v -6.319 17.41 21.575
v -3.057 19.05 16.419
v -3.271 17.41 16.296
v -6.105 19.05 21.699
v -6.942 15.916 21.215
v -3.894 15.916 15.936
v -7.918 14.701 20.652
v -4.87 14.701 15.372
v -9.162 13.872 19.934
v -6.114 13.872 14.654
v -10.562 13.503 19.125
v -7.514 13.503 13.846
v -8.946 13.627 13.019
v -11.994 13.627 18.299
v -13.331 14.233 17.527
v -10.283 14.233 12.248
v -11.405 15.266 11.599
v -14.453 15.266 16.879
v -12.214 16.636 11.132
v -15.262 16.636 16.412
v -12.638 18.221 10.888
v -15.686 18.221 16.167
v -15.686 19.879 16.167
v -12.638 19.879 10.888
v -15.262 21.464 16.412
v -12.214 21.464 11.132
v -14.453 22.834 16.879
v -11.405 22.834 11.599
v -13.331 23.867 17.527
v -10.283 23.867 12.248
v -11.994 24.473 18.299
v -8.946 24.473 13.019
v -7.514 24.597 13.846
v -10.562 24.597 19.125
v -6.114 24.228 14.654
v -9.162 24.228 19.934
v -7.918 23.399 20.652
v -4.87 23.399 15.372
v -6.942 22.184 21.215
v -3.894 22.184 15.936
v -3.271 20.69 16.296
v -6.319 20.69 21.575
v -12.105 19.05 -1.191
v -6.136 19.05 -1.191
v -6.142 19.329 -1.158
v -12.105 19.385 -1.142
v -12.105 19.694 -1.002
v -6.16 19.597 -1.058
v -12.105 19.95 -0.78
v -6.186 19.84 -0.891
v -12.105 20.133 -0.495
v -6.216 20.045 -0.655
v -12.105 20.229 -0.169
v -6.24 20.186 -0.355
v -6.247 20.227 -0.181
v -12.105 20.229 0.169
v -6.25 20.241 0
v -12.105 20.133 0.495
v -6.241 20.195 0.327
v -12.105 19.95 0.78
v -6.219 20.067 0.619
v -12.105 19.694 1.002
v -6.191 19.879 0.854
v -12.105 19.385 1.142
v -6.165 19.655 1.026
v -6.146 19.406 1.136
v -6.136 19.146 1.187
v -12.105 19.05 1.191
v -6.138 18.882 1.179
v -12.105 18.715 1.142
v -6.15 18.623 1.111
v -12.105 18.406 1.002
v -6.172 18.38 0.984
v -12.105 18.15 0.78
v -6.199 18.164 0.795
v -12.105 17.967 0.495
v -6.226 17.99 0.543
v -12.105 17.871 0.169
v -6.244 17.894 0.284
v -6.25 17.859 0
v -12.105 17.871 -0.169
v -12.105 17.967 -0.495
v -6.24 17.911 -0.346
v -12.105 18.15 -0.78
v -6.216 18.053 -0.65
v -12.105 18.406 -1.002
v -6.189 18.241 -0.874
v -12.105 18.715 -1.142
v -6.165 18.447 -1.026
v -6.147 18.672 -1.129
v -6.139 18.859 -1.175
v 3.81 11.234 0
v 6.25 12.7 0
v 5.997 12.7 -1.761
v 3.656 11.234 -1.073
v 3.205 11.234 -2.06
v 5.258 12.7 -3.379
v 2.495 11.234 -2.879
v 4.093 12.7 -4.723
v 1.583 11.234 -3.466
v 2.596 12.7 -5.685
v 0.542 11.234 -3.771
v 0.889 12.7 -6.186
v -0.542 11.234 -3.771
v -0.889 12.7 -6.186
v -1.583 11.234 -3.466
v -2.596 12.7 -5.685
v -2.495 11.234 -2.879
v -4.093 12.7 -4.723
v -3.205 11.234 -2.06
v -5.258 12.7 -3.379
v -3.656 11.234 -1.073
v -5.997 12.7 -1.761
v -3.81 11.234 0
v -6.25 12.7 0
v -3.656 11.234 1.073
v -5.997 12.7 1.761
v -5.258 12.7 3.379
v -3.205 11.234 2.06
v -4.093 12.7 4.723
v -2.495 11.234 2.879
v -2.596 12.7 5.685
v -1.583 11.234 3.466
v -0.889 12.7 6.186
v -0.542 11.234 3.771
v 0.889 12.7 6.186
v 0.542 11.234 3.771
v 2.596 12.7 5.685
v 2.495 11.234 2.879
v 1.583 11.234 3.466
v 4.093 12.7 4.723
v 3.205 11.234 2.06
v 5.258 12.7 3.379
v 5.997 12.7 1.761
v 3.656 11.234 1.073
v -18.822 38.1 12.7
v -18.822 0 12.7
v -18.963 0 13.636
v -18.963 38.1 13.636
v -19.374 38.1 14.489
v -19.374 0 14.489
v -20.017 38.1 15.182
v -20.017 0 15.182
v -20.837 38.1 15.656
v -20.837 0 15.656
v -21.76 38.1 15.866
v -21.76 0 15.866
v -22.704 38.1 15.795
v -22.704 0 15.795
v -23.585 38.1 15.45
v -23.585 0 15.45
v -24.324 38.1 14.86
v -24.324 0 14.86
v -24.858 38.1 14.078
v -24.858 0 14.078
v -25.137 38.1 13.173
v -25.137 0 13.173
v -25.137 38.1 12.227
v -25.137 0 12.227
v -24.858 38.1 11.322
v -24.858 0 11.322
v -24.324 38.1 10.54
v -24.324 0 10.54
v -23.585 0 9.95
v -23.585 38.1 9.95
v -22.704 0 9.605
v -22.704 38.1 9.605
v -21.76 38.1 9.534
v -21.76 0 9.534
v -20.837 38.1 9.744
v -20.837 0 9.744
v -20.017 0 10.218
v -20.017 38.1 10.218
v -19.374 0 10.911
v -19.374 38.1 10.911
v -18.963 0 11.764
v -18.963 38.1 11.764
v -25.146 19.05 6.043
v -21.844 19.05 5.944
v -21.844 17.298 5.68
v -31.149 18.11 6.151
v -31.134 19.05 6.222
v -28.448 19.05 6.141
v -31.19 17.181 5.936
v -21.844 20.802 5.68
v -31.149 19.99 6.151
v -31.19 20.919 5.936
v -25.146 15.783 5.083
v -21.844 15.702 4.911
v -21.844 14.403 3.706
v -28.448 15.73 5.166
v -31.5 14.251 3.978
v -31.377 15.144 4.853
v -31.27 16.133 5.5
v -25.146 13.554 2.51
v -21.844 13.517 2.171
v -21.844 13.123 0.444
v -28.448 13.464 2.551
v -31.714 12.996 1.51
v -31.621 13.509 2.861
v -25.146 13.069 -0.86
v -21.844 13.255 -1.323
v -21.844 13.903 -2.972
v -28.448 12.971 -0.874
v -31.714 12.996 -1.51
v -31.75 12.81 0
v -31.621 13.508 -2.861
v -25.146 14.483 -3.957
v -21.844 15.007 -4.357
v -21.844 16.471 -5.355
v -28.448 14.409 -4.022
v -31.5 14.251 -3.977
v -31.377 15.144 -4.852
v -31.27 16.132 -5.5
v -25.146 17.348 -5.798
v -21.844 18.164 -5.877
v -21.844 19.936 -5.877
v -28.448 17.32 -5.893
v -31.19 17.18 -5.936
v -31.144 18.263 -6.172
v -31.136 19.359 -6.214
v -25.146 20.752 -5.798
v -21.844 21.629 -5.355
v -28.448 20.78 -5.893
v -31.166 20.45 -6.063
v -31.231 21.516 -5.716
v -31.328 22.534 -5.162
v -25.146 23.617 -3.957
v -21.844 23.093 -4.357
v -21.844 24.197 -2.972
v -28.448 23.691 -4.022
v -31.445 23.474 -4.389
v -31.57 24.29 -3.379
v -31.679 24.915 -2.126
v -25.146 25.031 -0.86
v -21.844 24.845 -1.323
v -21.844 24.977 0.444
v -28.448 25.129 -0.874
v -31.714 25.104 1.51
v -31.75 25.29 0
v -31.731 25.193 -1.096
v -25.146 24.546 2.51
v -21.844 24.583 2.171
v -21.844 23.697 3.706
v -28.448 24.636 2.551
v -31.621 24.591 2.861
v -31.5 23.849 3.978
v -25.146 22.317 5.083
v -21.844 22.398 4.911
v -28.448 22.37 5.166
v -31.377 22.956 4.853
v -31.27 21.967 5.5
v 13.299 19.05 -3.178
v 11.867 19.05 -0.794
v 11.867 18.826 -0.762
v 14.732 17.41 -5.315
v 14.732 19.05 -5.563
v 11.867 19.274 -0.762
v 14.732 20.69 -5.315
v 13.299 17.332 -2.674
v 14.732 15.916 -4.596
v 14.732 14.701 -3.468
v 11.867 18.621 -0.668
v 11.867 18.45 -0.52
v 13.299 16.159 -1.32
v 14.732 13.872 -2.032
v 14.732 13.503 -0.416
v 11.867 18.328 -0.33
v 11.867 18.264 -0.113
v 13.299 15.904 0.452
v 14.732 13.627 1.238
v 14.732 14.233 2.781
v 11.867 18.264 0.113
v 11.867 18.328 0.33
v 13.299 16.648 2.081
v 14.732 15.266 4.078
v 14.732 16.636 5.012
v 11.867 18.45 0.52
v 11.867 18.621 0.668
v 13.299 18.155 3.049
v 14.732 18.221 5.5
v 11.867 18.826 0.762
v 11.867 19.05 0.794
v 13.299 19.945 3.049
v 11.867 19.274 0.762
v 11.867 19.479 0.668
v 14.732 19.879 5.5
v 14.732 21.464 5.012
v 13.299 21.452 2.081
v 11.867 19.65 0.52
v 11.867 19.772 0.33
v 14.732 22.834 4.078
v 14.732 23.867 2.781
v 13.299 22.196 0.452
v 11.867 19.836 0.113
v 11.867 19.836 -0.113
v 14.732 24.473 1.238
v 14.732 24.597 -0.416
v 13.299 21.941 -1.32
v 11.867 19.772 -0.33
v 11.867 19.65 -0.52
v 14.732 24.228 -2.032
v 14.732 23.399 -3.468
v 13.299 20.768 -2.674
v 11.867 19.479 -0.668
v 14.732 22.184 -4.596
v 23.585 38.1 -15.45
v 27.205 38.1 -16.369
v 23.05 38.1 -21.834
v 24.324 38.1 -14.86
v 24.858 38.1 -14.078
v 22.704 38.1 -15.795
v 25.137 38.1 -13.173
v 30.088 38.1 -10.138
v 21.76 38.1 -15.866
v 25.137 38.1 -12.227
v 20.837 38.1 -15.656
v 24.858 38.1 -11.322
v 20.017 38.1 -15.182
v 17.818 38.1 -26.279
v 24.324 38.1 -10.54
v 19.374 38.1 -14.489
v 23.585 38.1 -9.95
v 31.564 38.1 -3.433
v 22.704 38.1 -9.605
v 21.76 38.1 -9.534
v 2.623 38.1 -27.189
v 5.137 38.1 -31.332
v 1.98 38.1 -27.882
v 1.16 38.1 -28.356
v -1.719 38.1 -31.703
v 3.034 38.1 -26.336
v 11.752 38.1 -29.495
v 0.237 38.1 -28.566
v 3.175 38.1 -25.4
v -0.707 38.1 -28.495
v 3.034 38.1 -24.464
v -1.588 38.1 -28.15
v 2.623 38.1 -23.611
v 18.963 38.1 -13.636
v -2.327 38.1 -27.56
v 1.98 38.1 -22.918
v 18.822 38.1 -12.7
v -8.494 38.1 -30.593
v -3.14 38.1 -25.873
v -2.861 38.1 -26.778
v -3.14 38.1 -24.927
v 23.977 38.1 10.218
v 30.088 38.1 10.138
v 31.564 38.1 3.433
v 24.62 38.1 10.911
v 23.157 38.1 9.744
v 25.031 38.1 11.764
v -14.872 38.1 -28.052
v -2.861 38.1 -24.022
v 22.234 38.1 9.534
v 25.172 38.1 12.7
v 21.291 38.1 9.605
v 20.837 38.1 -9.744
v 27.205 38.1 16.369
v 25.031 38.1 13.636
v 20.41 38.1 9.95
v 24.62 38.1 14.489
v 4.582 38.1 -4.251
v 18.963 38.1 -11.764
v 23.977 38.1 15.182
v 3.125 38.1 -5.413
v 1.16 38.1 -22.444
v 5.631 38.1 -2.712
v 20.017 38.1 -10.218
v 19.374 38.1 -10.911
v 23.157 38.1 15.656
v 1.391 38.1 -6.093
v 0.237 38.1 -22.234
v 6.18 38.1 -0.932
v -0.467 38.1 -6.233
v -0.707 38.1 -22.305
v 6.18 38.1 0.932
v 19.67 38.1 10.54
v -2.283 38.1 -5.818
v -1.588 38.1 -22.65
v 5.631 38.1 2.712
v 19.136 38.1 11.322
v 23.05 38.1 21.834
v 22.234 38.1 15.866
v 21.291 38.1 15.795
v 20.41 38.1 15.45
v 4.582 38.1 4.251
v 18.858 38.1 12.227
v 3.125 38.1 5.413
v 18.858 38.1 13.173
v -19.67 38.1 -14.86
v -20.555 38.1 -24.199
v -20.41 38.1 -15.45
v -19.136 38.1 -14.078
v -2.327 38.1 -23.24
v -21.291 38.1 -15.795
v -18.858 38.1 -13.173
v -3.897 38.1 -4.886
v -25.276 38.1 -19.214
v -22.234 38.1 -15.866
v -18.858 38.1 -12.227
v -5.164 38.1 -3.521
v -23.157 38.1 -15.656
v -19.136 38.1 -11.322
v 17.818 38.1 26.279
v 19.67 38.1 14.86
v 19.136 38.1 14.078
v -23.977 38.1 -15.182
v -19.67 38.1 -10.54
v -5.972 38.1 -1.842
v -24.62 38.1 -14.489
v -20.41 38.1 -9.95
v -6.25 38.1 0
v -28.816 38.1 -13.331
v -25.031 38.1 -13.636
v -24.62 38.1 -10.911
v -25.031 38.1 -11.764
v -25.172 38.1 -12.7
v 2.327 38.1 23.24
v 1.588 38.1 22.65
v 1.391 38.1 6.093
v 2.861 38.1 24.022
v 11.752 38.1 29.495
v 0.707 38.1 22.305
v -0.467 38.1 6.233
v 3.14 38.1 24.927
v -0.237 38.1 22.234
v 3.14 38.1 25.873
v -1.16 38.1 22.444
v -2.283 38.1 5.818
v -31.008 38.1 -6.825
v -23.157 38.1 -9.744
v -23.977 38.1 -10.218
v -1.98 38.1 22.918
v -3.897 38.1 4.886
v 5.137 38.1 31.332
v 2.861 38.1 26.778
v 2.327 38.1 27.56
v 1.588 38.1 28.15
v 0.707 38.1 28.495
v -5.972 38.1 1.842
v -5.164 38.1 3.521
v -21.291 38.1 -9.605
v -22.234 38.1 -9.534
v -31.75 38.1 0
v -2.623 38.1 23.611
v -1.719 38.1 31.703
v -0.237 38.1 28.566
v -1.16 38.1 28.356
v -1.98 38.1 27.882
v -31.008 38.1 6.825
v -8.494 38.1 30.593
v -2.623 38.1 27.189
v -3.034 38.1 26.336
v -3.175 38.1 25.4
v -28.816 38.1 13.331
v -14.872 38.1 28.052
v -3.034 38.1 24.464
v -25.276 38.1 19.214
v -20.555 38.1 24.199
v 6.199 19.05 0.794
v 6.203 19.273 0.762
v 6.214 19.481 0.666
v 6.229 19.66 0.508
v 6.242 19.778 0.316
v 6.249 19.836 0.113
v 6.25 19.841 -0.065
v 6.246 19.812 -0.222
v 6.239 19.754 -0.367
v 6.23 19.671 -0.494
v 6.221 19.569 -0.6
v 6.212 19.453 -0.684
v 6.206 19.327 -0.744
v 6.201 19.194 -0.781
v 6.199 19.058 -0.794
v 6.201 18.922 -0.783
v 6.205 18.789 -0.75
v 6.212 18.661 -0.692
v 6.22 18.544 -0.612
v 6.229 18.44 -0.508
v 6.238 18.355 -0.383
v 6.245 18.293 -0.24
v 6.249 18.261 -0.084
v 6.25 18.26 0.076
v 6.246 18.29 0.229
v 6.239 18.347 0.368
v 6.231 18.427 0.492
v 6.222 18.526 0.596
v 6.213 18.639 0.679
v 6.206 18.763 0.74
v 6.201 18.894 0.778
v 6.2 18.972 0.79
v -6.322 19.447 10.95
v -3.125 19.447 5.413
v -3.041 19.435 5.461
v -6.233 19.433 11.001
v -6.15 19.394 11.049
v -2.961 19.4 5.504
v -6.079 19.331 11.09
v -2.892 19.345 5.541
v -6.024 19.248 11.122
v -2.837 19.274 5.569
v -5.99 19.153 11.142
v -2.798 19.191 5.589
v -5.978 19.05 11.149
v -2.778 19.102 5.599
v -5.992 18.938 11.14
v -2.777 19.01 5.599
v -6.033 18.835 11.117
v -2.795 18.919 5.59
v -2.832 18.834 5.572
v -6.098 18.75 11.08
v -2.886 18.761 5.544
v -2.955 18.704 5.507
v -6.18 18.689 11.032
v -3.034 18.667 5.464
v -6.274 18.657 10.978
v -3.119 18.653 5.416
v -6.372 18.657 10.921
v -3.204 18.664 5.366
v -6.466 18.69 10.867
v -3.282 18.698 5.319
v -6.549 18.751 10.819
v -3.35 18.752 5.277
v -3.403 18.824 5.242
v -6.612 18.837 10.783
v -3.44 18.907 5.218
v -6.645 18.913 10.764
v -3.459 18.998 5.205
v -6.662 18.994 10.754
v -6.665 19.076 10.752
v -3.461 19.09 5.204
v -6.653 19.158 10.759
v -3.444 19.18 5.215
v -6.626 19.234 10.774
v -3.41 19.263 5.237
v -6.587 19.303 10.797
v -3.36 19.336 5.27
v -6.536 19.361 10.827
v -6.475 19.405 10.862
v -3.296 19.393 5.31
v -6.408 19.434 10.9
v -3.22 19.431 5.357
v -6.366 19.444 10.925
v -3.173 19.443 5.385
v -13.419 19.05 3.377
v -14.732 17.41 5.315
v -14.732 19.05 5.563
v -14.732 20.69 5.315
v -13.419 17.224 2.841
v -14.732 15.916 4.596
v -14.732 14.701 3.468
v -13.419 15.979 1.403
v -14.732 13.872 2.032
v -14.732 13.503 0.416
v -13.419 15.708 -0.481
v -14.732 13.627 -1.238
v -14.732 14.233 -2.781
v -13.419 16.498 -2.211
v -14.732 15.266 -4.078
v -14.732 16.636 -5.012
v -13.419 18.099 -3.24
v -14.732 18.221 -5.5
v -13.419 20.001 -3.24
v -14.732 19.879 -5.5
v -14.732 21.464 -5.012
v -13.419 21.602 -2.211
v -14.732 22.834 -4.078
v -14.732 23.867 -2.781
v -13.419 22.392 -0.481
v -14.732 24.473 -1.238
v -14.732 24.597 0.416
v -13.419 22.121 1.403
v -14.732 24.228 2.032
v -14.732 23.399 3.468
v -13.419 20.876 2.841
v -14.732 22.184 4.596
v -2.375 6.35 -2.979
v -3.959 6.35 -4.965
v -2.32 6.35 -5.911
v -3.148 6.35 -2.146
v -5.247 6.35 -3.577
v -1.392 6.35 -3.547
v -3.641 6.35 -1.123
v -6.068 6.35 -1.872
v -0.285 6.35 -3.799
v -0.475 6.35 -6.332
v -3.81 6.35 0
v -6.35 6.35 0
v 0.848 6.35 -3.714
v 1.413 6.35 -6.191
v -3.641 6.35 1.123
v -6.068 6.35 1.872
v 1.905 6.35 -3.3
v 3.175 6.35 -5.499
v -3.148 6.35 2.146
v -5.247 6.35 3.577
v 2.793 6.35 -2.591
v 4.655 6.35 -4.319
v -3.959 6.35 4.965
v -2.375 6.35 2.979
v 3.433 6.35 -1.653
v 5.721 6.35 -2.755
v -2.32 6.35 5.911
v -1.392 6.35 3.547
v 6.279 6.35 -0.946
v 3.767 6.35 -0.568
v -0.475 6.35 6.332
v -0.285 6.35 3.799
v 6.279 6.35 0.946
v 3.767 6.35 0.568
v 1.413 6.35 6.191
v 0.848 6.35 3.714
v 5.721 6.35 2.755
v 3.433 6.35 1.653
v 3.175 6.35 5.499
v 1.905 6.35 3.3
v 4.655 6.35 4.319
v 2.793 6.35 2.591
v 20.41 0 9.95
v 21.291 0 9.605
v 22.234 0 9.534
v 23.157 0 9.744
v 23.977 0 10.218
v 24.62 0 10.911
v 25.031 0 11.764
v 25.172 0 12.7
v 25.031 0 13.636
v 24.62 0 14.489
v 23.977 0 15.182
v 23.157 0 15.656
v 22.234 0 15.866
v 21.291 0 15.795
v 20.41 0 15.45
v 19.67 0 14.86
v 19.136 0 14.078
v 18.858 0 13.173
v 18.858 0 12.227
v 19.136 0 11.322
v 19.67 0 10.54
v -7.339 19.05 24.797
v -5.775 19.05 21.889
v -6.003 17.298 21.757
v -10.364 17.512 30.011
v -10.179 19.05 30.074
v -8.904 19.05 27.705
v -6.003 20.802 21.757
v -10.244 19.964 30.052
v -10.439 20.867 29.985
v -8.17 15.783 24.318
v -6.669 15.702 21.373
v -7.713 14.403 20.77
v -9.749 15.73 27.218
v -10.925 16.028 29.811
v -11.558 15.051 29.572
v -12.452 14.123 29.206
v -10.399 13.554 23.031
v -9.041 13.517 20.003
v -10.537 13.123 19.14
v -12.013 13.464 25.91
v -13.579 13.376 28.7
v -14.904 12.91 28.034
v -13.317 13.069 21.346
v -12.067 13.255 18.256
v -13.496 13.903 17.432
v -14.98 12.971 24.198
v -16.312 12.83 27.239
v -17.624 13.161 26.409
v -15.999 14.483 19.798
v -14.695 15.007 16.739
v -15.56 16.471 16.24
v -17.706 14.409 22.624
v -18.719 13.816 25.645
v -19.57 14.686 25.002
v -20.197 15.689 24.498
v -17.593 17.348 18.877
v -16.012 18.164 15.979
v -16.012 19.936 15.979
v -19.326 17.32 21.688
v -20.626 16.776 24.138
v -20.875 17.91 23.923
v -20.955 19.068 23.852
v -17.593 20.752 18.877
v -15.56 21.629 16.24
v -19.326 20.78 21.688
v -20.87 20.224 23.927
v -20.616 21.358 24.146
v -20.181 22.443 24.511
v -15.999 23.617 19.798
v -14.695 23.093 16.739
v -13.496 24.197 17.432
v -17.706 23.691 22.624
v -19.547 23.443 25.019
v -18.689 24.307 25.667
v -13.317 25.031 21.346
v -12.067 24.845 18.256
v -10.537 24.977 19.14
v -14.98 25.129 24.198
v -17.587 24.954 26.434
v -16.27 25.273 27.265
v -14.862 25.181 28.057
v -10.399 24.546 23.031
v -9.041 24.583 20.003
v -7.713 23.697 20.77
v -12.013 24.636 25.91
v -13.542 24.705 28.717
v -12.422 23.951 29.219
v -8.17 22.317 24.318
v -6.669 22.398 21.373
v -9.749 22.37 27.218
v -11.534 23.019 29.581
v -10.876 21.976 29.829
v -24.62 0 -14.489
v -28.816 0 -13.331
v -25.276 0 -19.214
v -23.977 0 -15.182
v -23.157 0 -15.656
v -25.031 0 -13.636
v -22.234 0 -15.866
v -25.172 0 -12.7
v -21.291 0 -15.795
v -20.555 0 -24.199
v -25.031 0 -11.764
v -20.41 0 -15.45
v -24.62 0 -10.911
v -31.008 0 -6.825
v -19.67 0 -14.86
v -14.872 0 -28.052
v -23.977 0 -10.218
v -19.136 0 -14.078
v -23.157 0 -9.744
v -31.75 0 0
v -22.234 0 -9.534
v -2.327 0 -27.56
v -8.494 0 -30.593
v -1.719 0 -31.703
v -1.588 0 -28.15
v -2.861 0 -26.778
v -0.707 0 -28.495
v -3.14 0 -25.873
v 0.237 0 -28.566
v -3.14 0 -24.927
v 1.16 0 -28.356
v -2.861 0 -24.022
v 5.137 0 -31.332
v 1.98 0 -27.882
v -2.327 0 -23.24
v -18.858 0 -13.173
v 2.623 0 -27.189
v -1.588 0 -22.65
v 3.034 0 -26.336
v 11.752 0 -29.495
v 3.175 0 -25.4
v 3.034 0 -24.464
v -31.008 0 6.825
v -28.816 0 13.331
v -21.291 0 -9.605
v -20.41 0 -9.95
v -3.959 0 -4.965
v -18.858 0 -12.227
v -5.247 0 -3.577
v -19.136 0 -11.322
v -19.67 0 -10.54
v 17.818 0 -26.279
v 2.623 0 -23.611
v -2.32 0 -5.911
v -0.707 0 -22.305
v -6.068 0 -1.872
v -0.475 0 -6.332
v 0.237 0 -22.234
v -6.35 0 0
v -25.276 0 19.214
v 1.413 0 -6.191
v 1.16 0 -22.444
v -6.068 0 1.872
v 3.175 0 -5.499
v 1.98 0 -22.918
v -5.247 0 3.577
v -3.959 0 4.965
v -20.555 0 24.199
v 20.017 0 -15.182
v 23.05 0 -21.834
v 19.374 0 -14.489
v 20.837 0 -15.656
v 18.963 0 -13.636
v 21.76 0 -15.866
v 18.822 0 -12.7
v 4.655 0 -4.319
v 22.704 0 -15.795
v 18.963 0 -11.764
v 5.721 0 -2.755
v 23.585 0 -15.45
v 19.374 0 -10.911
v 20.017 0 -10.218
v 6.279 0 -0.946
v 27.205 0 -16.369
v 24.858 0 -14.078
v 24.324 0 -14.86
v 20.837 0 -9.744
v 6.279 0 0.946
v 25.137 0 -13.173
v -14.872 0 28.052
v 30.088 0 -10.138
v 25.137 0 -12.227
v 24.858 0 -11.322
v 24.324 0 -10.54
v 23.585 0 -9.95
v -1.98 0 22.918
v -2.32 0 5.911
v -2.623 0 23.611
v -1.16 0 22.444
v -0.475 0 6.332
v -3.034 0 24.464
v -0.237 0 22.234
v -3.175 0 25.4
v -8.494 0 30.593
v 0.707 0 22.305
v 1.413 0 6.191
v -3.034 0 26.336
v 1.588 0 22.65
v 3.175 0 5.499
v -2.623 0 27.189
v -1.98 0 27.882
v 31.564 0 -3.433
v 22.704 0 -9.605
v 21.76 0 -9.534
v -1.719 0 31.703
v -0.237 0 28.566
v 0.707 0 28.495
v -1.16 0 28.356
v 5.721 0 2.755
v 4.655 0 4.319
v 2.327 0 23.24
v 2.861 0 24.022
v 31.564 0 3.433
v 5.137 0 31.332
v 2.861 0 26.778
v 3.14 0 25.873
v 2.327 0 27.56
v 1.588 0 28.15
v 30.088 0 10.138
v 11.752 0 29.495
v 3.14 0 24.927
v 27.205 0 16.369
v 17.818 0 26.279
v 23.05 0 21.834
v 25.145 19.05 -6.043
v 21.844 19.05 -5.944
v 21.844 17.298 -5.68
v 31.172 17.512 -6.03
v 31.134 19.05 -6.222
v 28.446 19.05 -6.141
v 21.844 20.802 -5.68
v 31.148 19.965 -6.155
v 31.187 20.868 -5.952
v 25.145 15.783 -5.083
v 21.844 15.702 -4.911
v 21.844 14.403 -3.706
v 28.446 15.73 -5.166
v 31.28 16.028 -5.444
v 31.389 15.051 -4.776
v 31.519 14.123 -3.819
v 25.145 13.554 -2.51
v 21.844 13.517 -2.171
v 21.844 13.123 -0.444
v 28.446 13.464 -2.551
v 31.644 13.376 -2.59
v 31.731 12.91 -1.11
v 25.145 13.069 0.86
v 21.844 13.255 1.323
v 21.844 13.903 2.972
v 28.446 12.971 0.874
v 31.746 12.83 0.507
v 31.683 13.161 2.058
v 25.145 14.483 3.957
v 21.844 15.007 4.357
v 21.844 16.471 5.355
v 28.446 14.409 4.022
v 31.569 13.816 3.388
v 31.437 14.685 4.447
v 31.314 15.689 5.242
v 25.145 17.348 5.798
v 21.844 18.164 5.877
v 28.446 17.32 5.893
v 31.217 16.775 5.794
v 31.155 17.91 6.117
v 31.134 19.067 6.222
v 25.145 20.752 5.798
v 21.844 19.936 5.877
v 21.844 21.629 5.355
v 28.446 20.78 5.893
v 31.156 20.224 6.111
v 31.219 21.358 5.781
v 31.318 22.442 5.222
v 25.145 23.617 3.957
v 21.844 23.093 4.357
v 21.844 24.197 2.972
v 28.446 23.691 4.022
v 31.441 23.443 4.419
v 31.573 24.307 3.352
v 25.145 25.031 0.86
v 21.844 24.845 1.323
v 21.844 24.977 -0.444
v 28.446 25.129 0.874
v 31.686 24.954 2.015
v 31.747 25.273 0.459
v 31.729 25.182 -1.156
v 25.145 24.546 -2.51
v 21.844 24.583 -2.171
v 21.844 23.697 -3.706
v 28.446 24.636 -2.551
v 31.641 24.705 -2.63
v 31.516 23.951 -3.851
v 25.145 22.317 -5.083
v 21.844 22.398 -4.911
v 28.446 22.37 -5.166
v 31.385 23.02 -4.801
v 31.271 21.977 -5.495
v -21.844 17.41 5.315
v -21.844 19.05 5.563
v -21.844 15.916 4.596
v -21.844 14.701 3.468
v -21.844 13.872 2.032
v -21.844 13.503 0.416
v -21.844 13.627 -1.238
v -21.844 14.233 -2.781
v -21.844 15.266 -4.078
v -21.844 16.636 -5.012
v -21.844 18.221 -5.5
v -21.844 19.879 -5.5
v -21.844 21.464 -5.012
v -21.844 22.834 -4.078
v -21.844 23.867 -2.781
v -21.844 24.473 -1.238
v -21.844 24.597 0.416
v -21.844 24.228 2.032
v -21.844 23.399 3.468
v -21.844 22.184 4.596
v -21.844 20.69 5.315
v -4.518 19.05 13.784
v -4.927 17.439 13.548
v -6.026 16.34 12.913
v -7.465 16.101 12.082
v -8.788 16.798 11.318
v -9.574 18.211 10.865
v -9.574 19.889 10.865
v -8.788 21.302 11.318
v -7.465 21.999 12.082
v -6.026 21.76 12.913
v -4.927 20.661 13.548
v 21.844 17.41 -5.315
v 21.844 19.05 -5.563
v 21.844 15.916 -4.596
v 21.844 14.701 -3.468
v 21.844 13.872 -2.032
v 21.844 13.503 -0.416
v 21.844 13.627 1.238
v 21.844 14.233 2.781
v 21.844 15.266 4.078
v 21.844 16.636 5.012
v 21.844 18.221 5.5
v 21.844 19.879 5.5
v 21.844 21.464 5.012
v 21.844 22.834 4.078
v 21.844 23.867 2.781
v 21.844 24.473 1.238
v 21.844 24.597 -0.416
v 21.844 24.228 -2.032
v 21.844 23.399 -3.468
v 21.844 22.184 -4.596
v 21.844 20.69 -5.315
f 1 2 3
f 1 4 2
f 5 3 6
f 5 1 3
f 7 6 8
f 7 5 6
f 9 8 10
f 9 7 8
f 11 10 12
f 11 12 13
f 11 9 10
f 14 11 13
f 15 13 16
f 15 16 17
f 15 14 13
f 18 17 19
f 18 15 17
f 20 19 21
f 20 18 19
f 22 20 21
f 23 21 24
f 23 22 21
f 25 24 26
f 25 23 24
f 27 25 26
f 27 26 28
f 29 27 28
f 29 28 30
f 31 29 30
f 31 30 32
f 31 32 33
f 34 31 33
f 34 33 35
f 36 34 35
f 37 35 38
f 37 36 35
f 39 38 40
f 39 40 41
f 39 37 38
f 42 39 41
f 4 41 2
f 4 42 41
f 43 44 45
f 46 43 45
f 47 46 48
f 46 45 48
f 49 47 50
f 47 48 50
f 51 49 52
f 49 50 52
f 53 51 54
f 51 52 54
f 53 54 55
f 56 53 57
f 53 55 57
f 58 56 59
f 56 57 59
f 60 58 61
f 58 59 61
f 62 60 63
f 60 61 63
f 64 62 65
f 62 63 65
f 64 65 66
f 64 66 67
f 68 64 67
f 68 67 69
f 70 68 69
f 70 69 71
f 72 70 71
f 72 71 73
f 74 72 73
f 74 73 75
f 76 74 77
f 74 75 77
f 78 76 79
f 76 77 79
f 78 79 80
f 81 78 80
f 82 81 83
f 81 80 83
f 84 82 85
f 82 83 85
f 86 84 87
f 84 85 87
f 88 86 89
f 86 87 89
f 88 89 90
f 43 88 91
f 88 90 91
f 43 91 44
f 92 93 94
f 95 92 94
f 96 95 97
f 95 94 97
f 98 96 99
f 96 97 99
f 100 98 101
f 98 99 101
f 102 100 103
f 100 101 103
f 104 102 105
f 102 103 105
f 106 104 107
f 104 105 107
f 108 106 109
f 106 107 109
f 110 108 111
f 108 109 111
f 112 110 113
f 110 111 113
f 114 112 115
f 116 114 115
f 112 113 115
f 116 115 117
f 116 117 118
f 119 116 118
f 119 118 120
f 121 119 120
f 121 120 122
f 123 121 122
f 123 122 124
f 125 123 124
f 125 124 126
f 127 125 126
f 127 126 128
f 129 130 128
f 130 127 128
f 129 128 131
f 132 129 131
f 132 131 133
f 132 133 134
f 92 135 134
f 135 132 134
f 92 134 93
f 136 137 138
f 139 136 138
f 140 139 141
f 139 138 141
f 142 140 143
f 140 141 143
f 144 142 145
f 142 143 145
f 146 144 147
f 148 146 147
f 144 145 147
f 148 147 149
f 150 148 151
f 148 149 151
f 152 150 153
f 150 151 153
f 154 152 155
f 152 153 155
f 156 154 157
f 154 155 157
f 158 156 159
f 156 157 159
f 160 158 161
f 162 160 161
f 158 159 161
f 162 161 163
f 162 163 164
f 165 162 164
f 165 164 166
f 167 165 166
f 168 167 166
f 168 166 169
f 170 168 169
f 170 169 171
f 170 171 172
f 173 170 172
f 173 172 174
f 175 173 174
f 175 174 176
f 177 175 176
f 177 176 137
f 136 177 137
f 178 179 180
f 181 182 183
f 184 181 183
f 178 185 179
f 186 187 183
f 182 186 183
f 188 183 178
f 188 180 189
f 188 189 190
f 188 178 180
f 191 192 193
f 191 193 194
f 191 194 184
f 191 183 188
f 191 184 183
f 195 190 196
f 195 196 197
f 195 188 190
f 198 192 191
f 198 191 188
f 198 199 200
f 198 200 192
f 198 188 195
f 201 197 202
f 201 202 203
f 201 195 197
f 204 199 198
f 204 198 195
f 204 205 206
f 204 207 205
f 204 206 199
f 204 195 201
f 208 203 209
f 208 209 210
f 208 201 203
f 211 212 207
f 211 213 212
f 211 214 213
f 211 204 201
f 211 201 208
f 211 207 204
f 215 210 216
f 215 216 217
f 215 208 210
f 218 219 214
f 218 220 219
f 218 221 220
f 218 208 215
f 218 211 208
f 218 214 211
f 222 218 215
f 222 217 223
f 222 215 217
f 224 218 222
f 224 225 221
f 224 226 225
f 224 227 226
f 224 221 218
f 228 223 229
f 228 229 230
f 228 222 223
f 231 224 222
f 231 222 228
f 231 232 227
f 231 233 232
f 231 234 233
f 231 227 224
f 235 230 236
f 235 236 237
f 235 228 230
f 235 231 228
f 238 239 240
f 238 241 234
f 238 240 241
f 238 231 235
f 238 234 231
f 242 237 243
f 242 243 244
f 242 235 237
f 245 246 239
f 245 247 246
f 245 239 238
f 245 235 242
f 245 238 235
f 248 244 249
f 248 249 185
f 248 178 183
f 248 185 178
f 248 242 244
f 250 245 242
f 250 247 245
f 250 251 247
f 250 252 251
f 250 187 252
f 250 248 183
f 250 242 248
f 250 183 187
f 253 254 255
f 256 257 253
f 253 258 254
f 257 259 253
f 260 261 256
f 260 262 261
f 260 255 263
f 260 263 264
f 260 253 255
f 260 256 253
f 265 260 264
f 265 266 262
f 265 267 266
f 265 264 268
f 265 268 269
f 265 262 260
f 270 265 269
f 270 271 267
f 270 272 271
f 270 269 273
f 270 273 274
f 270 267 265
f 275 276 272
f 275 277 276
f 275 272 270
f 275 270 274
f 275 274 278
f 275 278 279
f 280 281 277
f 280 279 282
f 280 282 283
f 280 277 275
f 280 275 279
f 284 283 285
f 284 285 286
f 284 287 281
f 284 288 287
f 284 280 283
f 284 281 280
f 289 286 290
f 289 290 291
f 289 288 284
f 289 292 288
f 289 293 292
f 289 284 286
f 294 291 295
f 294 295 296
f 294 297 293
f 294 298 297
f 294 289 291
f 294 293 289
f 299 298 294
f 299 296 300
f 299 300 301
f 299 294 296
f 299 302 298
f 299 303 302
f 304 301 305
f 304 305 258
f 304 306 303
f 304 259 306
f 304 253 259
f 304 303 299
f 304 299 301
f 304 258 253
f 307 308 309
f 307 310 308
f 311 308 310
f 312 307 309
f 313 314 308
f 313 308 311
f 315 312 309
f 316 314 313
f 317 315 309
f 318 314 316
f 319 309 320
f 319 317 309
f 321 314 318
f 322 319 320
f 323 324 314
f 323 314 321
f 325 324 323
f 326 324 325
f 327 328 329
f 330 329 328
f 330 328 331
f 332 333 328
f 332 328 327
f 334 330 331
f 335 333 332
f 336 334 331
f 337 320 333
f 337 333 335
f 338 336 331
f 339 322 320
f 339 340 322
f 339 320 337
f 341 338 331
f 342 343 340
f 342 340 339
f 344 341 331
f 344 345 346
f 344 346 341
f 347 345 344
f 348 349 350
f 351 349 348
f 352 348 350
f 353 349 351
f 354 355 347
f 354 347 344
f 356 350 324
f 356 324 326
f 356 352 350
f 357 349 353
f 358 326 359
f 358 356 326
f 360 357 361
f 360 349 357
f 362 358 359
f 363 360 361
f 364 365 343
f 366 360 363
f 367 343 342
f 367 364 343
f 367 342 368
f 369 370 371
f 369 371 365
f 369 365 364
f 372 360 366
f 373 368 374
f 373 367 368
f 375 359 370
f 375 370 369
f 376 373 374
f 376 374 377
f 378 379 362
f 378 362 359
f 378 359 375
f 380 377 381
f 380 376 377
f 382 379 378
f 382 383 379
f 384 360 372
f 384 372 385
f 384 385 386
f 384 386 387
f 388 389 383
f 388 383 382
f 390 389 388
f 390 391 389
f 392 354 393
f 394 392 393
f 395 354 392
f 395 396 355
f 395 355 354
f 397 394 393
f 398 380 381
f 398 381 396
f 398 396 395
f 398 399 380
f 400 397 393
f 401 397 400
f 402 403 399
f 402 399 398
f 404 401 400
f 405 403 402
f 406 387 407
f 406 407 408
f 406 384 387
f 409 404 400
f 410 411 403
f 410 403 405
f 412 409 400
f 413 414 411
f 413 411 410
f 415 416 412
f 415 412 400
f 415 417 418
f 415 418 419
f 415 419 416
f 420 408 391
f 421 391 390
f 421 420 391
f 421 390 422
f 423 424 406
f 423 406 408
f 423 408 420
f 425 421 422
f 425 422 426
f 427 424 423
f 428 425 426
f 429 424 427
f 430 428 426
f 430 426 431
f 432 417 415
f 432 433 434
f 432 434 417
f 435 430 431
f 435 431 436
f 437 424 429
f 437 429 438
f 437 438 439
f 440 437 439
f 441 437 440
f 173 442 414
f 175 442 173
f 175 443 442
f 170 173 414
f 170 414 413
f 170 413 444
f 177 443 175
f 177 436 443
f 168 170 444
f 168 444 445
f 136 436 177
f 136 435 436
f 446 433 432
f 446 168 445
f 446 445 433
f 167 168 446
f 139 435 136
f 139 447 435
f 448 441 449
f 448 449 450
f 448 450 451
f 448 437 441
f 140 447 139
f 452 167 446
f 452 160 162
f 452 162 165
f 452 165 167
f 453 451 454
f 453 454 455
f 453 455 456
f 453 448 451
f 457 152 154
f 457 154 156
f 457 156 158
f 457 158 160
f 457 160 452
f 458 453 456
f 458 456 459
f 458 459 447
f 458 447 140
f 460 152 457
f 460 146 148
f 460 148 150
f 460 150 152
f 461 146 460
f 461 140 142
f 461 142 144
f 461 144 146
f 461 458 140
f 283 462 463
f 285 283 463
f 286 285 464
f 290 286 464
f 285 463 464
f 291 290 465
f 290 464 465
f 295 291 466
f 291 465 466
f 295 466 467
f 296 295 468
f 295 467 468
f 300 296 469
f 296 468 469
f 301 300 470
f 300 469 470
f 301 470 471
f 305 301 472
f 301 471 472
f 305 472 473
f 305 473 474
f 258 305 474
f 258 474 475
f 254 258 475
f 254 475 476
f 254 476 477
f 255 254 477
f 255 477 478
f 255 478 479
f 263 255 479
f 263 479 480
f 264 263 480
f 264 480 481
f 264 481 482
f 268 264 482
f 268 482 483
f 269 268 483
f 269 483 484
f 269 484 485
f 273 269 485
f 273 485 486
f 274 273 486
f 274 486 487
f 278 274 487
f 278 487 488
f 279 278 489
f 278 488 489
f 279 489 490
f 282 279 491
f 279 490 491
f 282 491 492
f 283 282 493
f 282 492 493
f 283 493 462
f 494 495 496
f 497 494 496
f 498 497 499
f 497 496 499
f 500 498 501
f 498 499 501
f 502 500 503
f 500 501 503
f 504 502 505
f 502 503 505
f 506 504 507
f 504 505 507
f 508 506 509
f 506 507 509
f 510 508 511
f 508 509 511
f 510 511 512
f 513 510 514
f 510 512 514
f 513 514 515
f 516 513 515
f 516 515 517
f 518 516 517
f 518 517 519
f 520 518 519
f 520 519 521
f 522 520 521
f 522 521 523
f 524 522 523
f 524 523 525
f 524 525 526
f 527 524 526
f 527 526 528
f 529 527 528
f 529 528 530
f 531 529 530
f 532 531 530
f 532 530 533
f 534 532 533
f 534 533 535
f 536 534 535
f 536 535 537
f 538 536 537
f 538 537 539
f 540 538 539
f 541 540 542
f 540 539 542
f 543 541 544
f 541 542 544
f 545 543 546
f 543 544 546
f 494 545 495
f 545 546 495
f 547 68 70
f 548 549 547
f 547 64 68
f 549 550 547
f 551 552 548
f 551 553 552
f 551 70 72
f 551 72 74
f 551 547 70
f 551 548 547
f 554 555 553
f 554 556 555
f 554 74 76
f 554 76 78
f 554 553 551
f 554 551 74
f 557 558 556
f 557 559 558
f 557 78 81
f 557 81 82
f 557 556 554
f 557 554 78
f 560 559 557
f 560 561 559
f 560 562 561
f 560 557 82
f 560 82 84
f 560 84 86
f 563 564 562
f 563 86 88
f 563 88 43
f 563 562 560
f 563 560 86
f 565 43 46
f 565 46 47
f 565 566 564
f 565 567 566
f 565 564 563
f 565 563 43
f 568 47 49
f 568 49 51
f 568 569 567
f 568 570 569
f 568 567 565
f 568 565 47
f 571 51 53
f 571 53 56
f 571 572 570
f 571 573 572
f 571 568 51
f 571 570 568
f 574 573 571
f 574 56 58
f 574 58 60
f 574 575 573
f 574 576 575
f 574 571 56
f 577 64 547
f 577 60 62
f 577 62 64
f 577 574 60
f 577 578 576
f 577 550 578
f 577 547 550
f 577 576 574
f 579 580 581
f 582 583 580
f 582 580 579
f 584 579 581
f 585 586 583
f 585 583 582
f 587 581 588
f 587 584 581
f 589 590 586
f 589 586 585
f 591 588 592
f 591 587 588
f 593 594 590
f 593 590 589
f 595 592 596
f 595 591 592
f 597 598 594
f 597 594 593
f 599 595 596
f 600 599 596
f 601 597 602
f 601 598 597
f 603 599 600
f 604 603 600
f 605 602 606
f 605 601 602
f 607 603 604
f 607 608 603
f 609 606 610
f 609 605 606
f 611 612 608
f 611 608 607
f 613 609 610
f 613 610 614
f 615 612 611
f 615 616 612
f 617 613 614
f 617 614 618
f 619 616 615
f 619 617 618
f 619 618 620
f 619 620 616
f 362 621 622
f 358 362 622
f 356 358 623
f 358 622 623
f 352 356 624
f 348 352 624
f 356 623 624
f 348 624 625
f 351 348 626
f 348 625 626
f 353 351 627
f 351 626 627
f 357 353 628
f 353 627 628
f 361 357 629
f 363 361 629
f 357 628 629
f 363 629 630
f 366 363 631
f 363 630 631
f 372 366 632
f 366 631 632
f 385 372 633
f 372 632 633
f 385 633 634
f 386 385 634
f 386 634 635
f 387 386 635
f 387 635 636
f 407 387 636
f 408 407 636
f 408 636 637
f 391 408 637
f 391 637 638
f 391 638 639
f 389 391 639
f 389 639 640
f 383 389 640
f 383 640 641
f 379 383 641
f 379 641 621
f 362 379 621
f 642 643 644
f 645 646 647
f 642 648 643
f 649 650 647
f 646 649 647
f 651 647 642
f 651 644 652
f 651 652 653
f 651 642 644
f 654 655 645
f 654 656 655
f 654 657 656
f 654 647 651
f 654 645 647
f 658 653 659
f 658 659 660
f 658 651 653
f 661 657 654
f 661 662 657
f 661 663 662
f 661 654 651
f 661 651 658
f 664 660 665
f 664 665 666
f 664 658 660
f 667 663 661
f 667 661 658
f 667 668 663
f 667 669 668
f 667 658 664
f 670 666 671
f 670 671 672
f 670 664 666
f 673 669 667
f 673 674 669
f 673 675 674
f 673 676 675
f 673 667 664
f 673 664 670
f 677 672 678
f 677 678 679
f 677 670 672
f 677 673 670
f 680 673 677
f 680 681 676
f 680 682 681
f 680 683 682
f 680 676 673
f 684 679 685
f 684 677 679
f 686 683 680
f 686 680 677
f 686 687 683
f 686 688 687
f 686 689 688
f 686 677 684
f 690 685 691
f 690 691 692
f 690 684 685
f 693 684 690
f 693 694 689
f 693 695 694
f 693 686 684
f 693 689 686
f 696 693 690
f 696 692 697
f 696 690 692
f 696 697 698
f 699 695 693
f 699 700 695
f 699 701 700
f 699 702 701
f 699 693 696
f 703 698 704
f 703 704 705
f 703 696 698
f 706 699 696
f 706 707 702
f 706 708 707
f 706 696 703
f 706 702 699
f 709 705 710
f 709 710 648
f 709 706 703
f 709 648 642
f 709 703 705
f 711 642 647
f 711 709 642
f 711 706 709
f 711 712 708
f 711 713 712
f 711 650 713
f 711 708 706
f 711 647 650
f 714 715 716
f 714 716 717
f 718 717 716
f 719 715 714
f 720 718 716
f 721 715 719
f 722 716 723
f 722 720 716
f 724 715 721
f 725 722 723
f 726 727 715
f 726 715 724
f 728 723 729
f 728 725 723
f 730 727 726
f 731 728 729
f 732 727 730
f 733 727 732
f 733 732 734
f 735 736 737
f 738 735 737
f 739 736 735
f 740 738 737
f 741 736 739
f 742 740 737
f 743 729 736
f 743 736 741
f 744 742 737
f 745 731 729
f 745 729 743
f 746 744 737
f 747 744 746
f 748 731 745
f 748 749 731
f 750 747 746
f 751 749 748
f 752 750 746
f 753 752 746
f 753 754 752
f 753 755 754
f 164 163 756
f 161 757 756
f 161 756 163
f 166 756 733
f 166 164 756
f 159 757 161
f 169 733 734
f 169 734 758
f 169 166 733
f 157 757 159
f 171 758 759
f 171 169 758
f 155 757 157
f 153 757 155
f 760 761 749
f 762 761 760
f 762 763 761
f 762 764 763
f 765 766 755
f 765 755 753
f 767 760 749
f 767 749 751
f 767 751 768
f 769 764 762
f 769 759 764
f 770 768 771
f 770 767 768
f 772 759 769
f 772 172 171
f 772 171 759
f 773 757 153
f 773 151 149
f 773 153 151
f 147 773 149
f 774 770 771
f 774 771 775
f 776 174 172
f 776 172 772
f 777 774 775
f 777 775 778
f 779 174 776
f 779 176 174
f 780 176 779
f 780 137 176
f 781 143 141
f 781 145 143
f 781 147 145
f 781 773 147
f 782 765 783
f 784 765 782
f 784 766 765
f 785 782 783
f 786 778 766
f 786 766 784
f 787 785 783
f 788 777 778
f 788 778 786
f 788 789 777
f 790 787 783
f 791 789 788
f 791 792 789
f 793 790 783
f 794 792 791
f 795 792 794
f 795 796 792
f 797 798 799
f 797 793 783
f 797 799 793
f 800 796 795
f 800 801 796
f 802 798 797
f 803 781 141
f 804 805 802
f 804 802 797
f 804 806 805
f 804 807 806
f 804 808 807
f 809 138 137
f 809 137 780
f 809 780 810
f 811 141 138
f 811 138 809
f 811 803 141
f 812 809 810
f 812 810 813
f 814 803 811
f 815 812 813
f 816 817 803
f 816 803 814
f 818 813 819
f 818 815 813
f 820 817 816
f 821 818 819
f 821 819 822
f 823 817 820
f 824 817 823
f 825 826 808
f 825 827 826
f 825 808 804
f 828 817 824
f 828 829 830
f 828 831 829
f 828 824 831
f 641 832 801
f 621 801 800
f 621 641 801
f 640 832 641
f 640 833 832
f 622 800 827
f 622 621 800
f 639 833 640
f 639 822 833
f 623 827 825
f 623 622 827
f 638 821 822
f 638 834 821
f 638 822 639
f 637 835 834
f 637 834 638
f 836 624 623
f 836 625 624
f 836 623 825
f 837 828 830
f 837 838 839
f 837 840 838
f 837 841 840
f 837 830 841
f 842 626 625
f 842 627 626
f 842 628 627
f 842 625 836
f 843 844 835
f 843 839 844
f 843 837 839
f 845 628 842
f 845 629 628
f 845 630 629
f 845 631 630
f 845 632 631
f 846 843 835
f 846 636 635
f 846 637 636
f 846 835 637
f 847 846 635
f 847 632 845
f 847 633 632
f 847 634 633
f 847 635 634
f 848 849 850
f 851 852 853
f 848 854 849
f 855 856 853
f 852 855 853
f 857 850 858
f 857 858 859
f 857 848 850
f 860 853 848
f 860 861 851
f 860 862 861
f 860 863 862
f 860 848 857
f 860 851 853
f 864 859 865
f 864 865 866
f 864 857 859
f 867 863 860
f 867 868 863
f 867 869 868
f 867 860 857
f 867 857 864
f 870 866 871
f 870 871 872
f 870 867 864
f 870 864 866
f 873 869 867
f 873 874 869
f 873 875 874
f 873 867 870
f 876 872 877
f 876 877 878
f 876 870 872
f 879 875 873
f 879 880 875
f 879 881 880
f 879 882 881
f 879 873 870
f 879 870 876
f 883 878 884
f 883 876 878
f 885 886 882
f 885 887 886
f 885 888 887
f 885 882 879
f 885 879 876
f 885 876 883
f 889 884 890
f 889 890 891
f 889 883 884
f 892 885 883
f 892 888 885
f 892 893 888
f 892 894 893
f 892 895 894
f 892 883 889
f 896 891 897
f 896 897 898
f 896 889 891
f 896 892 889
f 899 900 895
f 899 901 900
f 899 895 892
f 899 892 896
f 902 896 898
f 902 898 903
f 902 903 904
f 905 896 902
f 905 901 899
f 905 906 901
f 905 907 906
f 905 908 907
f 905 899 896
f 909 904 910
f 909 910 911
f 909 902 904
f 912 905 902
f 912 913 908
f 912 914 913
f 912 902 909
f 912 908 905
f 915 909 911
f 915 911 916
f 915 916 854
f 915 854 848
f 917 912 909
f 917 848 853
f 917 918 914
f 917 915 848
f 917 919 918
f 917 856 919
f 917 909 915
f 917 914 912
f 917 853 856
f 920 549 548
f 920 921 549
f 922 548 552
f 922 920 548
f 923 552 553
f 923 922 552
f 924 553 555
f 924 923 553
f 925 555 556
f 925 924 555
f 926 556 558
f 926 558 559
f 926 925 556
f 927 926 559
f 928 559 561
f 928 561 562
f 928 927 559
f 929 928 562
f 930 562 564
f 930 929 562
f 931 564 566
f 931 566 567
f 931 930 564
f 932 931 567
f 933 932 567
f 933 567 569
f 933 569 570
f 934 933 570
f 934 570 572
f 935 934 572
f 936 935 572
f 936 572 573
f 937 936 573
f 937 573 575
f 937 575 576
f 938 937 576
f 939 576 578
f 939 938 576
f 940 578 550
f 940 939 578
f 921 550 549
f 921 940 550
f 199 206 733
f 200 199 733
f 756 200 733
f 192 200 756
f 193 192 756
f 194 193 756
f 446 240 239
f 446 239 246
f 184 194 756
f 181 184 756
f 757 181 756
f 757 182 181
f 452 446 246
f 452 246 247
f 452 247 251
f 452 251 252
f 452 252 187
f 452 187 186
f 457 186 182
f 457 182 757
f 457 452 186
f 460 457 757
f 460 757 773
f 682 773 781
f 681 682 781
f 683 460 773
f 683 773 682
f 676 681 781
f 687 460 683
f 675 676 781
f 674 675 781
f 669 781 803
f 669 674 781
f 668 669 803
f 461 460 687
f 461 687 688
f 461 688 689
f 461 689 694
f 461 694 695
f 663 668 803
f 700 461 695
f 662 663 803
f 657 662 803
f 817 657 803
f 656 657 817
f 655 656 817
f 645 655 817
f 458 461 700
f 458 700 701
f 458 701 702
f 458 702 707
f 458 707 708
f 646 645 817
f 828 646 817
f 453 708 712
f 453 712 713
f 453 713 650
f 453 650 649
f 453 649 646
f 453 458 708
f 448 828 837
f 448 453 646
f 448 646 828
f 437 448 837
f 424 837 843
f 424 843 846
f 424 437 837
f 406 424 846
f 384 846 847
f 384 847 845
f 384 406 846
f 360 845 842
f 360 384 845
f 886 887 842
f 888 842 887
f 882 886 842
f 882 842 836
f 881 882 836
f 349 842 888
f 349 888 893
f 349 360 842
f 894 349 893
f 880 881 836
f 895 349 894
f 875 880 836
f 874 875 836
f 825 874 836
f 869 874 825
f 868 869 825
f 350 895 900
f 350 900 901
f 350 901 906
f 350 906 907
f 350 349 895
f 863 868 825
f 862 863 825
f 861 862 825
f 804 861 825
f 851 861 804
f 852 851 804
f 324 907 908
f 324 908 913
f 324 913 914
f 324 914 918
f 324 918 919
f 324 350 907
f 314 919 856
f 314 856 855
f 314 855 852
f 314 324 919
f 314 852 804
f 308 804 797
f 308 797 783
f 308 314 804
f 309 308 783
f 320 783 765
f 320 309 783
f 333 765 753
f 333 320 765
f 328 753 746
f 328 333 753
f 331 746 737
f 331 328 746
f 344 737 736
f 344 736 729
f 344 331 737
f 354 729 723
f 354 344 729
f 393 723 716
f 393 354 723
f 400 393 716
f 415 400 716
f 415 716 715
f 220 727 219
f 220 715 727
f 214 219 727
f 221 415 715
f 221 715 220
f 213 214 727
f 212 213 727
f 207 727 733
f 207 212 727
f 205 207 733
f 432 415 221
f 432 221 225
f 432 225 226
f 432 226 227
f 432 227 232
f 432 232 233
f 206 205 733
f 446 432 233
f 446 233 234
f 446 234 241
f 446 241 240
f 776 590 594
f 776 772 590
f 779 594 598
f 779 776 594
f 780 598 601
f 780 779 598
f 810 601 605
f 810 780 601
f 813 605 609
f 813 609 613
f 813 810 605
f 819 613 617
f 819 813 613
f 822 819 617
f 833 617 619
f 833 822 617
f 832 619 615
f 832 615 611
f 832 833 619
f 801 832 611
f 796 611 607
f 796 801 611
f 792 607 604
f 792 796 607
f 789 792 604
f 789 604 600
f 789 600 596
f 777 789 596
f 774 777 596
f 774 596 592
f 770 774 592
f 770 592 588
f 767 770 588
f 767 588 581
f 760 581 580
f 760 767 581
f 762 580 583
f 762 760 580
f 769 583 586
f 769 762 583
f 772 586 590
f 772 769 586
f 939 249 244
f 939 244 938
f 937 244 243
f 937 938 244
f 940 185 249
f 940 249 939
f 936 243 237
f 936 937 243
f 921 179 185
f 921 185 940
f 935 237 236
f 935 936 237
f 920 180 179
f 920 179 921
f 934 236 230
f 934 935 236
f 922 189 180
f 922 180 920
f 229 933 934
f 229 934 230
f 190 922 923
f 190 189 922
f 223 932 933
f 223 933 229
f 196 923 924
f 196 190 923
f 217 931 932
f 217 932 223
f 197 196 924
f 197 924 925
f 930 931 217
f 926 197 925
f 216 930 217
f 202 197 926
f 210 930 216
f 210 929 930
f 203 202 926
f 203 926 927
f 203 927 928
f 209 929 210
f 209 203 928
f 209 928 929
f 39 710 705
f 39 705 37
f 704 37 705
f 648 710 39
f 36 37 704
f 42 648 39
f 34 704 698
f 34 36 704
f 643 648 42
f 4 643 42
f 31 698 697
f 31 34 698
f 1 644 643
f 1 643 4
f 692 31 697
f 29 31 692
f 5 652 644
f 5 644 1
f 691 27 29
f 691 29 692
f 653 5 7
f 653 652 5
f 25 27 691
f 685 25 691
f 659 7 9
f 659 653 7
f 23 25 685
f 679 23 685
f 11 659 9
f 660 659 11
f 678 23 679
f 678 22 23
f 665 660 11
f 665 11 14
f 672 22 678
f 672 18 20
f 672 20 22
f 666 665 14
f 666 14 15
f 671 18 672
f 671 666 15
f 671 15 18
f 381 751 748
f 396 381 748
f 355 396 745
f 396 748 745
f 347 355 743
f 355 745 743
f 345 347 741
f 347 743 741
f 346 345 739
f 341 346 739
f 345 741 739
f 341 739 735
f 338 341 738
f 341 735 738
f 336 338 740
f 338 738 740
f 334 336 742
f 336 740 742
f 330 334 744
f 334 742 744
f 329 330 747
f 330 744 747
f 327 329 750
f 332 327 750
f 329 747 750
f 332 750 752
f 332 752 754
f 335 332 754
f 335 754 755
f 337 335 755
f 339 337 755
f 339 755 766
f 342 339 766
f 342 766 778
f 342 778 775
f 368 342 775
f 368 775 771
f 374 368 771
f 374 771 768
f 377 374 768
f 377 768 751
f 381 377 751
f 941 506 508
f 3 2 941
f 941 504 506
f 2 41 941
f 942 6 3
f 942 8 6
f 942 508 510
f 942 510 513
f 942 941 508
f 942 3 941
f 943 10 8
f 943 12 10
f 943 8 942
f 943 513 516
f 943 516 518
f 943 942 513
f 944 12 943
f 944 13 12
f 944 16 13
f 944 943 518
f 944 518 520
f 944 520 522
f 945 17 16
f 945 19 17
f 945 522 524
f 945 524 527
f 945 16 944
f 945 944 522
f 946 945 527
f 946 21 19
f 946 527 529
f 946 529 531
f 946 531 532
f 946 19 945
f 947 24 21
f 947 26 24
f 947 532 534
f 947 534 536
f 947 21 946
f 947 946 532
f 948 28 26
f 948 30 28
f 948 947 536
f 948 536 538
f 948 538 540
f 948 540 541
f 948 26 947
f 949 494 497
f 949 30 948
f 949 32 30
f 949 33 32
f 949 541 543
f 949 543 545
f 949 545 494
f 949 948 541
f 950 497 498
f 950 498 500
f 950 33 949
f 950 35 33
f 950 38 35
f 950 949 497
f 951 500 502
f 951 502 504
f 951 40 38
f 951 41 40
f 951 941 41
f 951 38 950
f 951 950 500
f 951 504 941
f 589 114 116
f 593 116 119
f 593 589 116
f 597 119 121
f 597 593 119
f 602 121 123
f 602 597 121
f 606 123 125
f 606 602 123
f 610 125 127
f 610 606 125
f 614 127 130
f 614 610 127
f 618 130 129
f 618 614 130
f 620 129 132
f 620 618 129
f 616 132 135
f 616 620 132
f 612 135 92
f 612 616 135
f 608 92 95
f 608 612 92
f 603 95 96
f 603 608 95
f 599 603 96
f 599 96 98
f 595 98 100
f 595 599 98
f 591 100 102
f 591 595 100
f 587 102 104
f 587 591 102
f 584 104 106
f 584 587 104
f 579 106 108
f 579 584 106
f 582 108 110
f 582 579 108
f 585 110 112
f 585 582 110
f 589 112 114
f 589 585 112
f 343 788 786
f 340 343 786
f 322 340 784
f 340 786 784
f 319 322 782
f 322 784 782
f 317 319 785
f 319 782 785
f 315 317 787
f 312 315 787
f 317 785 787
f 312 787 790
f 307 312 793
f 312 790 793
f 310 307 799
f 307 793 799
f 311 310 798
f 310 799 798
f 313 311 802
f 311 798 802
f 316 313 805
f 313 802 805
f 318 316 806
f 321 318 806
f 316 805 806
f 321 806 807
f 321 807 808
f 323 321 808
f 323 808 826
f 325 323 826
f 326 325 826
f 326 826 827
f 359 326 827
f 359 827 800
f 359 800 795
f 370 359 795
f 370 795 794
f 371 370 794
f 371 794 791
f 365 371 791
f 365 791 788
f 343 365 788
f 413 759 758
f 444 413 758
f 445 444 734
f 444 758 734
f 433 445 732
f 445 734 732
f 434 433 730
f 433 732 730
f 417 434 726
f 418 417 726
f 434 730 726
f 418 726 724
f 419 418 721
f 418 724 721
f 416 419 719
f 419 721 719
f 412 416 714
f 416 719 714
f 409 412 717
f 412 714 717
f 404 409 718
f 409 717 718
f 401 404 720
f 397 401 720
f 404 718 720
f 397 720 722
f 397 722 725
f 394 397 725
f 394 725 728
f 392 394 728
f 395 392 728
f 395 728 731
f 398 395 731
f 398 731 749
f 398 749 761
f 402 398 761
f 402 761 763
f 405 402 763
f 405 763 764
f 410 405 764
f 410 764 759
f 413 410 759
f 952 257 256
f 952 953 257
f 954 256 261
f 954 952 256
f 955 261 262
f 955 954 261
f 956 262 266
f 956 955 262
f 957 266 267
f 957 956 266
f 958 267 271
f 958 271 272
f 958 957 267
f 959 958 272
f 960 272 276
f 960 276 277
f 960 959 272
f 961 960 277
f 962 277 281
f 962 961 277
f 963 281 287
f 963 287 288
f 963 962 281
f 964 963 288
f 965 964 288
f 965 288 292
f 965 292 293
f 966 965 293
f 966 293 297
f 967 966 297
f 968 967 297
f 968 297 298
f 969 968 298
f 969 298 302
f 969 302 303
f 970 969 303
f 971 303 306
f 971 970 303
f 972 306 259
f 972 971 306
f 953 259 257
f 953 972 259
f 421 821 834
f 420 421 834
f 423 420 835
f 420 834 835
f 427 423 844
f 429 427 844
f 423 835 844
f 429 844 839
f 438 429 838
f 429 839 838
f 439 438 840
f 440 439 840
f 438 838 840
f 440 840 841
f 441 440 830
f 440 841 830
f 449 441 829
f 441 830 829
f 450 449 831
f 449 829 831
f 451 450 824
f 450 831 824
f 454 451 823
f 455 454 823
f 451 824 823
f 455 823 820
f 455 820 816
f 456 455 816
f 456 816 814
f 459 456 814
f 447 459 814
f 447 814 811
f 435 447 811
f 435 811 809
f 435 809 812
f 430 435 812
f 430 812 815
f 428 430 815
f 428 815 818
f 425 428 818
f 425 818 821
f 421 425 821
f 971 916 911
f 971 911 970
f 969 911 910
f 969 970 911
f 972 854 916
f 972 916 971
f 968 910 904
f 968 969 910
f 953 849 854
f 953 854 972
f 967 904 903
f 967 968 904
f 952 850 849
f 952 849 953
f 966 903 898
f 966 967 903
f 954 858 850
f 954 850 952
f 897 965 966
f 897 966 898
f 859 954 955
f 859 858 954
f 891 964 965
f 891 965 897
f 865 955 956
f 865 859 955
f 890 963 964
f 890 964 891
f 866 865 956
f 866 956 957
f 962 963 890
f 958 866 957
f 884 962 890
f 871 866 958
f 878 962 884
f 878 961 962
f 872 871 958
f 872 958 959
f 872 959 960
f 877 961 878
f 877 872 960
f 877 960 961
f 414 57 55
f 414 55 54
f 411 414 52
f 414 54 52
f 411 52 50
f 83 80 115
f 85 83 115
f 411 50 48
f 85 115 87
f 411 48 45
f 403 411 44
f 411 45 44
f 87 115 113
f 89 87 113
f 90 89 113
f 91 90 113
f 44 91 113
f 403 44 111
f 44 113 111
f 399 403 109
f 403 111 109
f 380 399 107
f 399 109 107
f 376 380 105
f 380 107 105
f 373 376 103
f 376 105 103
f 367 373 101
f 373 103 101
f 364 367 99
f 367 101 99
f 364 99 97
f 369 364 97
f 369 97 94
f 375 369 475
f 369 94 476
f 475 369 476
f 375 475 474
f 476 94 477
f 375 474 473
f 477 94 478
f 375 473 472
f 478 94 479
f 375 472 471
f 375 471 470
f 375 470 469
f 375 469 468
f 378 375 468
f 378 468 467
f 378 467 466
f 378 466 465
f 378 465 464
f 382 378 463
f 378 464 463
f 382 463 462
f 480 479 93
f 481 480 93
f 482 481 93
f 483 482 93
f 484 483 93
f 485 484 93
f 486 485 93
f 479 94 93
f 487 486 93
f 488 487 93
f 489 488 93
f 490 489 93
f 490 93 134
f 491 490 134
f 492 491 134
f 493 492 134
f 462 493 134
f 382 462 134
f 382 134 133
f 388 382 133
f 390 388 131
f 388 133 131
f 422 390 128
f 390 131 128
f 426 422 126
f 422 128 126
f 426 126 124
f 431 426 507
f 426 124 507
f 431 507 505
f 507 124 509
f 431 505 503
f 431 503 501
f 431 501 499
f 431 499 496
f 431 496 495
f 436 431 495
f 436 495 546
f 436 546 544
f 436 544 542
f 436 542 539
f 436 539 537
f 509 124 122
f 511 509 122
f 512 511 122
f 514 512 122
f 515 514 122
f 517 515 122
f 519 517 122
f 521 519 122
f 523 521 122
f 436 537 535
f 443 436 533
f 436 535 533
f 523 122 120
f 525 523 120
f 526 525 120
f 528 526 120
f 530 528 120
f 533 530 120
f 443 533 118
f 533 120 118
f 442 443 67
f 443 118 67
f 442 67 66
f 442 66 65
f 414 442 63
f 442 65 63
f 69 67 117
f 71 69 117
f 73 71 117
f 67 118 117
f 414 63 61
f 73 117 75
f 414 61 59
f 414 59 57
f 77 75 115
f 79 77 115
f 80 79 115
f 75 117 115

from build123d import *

# Parameters (mm, degrees)
M14X1_5_TAPPED_HOLE1_D              = 12.5
M14X1_5_TAPPED_HOLE1_DEPTH          = 25.4
M14X1_5_TAPPED_HOLE1_TIP            = 3.755378869
F_1_16_0_0625_DIAMETER_HOLE1_D      = 1.5875
F_1_16_0_0625_DIAMETER_HOLE1_DEPTH  = 28.575
F_1_16_0_0625_DIAMETER_HOLE1_TIP    = 0.476933116
F_3_32_0_09375_DIAMETER_HOLE1_D     = 2.38125
F_3_32_0_09375_DIAMETER_HOLE1_DEPTH = 28.702
F_3_32_0_09375_DIAMETER_HOLE1_TIP   = 0.715399675
F_1_4_0_25_DIAMETER_HOLE1_D         = 6.35
CIRPATTERN1_COUNT                   = 6
F_1_32_0_03125_DIAMETER_HOLE2_D     = 0.79375
F_1_32_0_03125_DIAMETER_HOLE2_DEPTH = 28.575
F_1_32_0_03125_DIAMETER_HOLE2_TIP   = 0.238466558


with BuildPart() as part:
    # Sketch1 → Revolve1 (revolve)
    with BuildSketch(Plane.XY):
        Polygon((-6.35, 0), (-31.75, 0), (-31.75, 38.1), (-3.81, 38.1), (-3.81, 6.35), (-6.35, 6.35), align=None)
    revolve(axis=Axis((0, 0, 0), (0, 1, 0)))

    # M14x1.5 Tapped Hole1
    with Locations(Plane(origin=(0, 38.1, 0), x_dir=(1, 0, 0), z_dir=(0, 1, 0))):
        with Locations((0, 0)):
            Hole(M14X1_5_TAPPED_HOLE1_D / 2, depth=M14X1_5_TAPPED_HOLE1_DEPTH)
            with Locations((0, 0, -(M14X1_5_TAPPED_HOLE1_DEPTH + M14X1_5_TAPPED_HOLE1_TIP / 2))):  # 118° drill point
                Cone(0, M14X1_5_TAPPED_HOLE1_D / 2, M14X1_5_TAPPED_HOLE1_TIP, mode=Mode.SUBTRACT)

    # Sketch6 → 1/4 NPT Tapped Hole1 (revolve, cut)
    with BuildSketch(Plane(origin=(31.75, 19.05, 0), x_dir=(0, 0, -1), z_dir=(0, 1, 0))):
        Polygon((0, 0), (0, 20.360347279), (5.5626, 17.018), (5.5626, 9.906), (5.943685794, 9.906), (6.2402847, 0), align=None)
    revolve(axis=Axis((38.1, 19.05, 0), (-1, 0, 0)), mode=Mode.SUBTRACT)

    # Sketch8 → 1/4 NPT Tapped Hole2 (revolve, cut)
    with BuildSketch(Plane(origin=(-31.75, 19.05, 0), x_dir=(0, 0, 1), z_dir=(0, 1, 0))):
        Polygon((0, 0), (0, 20.360347279), (5.5626, 17.018), (5.5626, 9.906), (5.943685794, 9.906), (6.2402847, 0), align=None)
    revolve(axis=Axis((-38.1, 19.05, 0), (1, 0, 0)), mode=Mode.SUBTRACT)

    # 1/16 (0.0625) Diameter Hole1
    with Locations(Plane(origin=(31.75, 0, 0), x_dir=(0, 0, -1), z_dir=(1, 0, 0))):
        with Locations((0, 19.05)):
            Hole(F_1_16_0_0625_DIAMETER_HOLE1_D / 2, depth=F_1_16_0_0625_DIAMETER_HOLE1_DEPTH)
            with Locations((0, 0, -(F_1_16_0_0625_DIAMETER_HOLE1_DEPTH + F_1_16_0_0625_DIAMETER_HOLE1_TIP / 2))):  # 118° drill point
                Cone(0, F_1_16_0_0625_DIAMETER_HOLE1_D / 2, F_1_16_0_0625_DIAMETER_HOLE1_TIP, mode=Mode.SUBTRACT)

    # 3/32 (0.09375) Diameter Hole1
    with Locations(Plane.ZY.offset(31.75)):
        with Locations((0, 19.05)):
            Hole(F_3_32_0_09375_DIAMETER_HOLE1_D / 2, depth=F_3_32_0_09375_DIAMETER_HOLE1_DEPTH)
            with Locations((0, 0, -(F_3_32_0_09375_DIAMETER_HOLE1_DEPTH + F_3_32_0_09375_DIAMETER_HOLE1_TIP / 2))):  # 118° drill point
                Cone(0, F_3_32_0_09375_DIAMETER_HOLE1_D / 2, F_3_32_0_09375_DIAMETER_HOLE1_TIP, mode=Mode.SUBTRACT)

    # 1/4 (0.25) Diameter Hole1 (through all)
    with Locations(Plane(origin=(0, 38.1, 0), x_dir=(1, 0, 0), z_dir=(0, 1, 0))):
        with Locations((21.997045256, 12.7)):
            f_1_4_0_25_diameter_hole1 = Hole(F_1_4_0_25_DIAMETER_HOLE1_D / 2)

    # CirPattern1: 1/4 (0.25) Diameter Hole1 ×6 about axis
    cirpattern1_axis = Axis((0, 0, 0), (0, 1, 0))
    for i in range(1, CIRPATTERN1_COUNT):
        add(f_1_4_0_25_diameter_hole1.rotate(cirpattern1_axis, i * 360 / CIRPATTERN1_COUNT), mode=Mode.SUBTRACT)

    # Sketch18 → 1/4 NPT Tapped Hole3 (revolve, cut)
    with BuildSketch(Plane(origin=(-15.875, 19.05, 27.49630657), x_dir=(0.866025404, 0, 0.5), z_dir=(0, 1, 0))):
        Polygon((0, 0), (0, 19.344347279), (5.5626, 16.002), (5.5626, 9.906), (5.943685794, 9.906), (6.2402847, 0), align=None)
    revolve(axis=Axis((-19.05, 19.05, 32.995567884), (0.5, 0, -0.866025404)), mode=Mode.SUBTRACT)

    # 1/32 (0.03125) Diameter Hole2
    with Locations(Plane(origin=(-15.875, 0, 27.49630657), x_dir=(0, -1, 0), z_dir=(-0.5, 0, 0.866025404))):
        with Locations((-19.05, 0)):
            Hole(F_1_32_0_03125_DIAMETER_HOLE2_D / 2, depth=F_1_32_0_03125_DIAMETER_HOLE2_DEPTH)
            with Locations((0, 0, -(F_1_32_0_03125_DIAMETER_HOLE2_DEPTH + F_1_32_0_03125_DIAMETER_HOLE2_TIP / 2))):  # 118° drill point
                Cone(0, F_1_32_0_03125_DIAMETER_HOLE2_D / 2, F_1_32_0_03125_DIAMETER_HOLE2_TIP, mode=Mode.SUBTRACT)


solid = part.part
